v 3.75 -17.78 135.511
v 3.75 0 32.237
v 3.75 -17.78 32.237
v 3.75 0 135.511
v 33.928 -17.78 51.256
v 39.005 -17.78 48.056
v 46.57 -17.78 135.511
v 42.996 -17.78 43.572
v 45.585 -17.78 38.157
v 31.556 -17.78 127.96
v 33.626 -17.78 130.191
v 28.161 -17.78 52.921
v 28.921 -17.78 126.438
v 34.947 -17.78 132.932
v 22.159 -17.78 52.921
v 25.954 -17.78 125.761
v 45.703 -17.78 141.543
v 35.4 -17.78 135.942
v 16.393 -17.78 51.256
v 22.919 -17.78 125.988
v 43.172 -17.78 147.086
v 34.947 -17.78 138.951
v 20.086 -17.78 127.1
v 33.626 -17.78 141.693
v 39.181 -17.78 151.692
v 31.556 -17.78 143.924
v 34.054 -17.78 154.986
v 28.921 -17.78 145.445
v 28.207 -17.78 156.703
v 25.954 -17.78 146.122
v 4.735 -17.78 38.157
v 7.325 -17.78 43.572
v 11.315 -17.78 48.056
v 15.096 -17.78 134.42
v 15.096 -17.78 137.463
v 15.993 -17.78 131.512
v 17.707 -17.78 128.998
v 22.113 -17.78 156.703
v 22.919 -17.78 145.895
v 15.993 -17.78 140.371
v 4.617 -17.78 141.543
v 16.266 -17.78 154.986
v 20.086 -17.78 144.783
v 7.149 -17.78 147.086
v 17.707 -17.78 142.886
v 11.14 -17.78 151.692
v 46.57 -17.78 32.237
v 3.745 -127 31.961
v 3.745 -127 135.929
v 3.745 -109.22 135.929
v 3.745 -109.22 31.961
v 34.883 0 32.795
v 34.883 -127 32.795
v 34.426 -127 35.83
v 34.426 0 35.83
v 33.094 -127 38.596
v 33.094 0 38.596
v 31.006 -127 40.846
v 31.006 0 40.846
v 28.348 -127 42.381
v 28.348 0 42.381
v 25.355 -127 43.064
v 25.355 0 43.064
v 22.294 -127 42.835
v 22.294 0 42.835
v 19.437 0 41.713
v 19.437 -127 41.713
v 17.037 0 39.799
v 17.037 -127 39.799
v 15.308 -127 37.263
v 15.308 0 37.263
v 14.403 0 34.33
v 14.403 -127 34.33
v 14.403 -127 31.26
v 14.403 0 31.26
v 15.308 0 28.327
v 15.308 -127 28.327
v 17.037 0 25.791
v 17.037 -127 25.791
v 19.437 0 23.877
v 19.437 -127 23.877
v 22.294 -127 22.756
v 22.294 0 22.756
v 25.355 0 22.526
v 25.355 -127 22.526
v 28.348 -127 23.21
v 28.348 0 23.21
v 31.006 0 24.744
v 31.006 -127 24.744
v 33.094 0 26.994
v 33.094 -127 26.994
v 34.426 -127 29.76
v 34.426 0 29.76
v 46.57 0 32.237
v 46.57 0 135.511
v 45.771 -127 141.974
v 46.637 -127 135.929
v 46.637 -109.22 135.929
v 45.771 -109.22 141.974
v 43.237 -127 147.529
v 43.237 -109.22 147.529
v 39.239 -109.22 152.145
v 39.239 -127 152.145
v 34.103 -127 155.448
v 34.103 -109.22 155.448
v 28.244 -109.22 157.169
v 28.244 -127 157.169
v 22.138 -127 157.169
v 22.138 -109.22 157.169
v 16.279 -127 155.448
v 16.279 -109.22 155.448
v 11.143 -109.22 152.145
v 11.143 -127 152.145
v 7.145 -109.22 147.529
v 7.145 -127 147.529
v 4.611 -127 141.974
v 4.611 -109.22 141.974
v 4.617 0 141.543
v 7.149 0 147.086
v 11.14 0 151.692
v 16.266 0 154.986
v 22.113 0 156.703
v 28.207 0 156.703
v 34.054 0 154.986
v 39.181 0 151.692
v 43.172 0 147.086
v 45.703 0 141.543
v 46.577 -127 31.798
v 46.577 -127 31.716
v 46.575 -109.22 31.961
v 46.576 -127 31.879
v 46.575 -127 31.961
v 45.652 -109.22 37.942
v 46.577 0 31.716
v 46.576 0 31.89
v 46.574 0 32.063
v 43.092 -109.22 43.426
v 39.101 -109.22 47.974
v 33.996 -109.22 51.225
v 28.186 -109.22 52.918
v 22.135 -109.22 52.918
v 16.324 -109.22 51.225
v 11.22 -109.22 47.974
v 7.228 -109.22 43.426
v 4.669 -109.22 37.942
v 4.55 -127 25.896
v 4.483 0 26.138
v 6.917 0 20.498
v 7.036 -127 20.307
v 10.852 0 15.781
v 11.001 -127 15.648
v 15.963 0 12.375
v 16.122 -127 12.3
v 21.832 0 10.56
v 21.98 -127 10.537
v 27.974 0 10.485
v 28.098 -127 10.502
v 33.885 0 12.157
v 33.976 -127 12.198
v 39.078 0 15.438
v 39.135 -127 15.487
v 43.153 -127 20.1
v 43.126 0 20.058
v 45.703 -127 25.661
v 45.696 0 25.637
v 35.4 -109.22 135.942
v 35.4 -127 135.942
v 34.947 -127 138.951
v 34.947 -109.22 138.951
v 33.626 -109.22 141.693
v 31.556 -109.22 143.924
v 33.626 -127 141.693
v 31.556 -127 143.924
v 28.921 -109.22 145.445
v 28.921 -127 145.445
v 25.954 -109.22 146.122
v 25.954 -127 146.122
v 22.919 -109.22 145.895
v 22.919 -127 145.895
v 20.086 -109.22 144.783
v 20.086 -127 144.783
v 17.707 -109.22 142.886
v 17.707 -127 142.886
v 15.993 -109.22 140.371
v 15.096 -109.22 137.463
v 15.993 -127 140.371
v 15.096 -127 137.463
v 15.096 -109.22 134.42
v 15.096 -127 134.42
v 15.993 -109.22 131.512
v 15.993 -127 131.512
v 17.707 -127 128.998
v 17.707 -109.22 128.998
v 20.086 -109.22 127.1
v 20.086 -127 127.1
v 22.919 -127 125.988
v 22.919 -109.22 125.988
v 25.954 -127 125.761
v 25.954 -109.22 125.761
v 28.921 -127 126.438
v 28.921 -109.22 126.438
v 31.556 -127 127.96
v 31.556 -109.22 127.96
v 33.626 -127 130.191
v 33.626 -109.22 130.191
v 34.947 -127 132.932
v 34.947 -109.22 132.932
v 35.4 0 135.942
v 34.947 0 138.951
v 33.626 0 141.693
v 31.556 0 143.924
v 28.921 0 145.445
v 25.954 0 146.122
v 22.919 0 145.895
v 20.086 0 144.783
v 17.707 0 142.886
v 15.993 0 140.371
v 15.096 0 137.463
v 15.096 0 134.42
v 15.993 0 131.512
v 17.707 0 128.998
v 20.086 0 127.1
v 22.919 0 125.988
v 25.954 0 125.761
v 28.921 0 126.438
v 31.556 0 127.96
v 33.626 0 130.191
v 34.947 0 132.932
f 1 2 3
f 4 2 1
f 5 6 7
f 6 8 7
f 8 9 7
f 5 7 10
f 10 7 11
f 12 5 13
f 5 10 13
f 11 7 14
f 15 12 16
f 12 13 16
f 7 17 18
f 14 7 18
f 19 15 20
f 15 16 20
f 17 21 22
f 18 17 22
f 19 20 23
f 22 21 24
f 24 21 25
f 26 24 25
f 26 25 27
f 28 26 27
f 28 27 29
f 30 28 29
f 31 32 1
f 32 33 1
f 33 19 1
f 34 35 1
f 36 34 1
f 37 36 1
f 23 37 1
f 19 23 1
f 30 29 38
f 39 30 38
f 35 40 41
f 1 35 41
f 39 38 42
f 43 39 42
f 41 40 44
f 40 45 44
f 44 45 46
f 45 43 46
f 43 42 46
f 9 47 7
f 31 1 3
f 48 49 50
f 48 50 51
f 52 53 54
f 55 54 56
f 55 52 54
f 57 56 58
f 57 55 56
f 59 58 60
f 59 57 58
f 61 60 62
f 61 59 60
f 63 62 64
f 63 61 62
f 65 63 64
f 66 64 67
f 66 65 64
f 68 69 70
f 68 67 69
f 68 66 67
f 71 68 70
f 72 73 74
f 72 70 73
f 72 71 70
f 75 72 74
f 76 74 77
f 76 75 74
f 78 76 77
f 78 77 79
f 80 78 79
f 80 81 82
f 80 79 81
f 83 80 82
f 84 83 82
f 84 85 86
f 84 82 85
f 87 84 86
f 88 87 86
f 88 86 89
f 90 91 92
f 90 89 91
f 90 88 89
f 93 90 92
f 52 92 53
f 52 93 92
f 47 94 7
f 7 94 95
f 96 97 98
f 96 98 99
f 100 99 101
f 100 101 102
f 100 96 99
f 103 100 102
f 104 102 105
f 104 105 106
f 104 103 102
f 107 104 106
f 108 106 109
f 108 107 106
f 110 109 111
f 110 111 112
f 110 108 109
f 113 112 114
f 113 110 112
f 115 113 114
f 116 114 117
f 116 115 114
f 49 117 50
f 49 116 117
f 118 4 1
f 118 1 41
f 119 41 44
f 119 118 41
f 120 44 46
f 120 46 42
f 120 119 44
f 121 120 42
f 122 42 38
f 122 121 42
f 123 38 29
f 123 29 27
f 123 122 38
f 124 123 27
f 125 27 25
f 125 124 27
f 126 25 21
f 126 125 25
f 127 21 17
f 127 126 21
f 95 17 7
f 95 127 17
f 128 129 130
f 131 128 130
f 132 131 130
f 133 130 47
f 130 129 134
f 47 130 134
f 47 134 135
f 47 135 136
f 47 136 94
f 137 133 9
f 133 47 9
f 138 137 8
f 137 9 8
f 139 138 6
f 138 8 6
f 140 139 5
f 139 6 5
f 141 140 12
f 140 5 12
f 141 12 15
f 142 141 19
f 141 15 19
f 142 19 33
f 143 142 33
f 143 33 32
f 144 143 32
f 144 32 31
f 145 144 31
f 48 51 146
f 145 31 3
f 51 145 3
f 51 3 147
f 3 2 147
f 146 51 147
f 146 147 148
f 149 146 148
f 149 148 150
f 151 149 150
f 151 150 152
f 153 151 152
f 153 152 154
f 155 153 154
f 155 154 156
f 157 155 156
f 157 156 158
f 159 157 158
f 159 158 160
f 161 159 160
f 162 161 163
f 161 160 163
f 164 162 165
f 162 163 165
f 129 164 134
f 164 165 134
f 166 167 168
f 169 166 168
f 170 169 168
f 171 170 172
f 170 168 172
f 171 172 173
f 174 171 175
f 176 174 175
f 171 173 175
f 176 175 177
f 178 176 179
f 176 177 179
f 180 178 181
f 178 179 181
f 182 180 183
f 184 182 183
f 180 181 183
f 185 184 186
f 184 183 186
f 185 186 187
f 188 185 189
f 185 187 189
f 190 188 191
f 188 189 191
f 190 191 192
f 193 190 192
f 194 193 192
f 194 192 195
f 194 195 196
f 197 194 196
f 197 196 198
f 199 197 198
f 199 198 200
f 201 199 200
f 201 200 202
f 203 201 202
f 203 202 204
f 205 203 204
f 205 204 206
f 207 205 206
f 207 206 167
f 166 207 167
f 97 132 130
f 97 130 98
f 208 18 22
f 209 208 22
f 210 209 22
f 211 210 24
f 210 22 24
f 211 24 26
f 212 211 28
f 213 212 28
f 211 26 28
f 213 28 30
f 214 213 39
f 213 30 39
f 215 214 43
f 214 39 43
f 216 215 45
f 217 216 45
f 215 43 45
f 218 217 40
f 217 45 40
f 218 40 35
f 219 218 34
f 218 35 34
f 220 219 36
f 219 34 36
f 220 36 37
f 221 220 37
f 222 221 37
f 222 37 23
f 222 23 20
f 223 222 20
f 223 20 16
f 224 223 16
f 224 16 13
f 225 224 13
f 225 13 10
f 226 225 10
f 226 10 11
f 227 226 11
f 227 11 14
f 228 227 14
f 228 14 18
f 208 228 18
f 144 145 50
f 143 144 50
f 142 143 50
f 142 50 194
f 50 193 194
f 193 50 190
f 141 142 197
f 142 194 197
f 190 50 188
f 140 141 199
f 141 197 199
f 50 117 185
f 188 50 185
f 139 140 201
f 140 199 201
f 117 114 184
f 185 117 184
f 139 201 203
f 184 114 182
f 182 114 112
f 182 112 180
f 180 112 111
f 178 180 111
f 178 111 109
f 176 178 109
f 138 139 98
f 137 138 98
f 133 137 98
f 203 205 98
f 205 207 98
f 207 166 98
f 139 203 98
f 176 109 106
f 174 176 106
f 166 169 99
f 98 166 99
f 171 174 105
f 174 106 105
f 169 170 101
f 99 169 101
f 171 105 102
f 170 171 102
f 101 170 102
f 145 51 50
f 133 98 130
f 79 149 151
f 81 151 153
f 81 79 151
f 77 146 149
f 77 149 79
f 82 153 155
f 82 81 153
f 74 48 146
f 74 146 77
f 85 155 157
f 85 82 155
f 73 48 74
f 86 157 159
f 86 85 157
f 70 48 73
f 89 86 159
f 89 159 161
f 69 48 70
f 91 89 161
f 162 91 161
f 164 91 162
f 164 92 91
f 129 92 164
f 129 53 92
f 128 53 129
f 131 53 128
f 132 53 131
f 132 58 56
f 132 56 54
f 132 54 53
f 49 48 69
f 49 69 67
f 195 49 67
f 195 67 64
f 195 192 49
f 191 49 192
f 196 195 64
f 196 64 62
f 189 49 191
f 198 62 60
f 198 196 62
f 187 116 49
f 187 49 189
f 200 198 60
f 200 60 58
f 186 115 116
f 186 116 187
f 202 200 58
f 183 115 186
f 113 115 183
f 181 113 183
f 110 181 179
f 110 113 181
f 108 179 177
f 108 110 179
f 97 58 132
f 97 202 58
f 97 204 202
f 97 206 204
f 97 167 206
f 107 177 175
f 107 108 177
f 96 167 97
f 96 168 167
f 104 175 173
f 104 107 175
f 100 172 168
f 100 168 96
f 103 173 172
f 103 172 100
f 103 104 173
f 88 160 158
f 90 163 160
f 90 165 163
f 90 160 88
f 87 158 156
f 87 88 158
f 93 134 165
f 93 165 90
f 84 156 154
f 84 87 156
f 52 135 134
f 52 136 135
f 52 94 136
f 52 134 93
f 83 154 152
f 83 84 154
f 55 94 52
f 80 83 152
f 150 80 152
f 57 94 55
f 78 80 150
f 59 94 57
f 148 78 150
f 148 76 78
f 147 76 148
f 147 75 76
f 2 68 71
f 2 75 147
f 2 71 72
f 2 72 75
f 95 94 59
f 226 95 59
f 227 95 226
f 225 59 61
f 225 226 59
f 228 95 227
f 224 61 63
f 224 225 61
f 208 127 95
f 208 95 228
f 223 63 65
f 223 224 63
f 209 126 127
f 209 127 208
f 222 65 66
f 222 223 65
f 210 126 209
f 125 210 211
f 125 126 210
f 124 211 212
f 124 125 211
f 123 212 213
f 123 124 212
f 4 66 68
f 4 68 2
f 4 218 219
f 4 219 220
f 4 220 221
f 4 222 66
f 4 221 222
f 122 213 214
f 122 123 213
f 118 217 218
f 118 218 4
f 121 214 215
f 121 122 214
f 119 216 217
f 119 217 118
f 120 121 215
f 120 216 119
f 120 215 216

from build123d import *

# Parameters (mm, degrees)
F0_R      = 21.4164389033
F1_DEPTH  = 127
F2_W      = 42.8202235004
F2_H      = 103.2743248374
F3_DEPTH  = 17.78
F5_DEPTH  = 17.78
F6_R      = 7.3683109371
F7_DEPTH  = 273
F8_R      = 10.2975296605
F9_DEPTH  = 127.001
F11_DEPTH = 17.78
F13_DEPTH = 17.78
F14_R     = 10.2092328794
F15_DEPTH = 127.001


# Not quite as in the source:
# - an extrude ends at something that could not be found from the text; its depth is read off the source's solid


with BuildPart() as f1:
    # F0 (on Front) → F1 (new body)
    with BuildSketch(Plane.XZ):
        with Locations((25.1603480428, 31.716234982)):
            Circle(F0_R)
    extrude(amount=F1_DEPTH)

    # F2 (on face) → F3 (join)
    with BuildSketch(Plane(origin=(0, 0, 0), x_dir=(-1, 0, 0), z_dir=(0, 1, 0))):
        with Locations((-25.1603480428, 83.8739453241)):
            Rectangle(F2_W, F2_H)
    extrude(amount=-F3_DEPTH)

    # F4 (on face) → F5 (join)
    with BuildSketch(Plane.XZ.offset(127)):
        Polygon((3.7453082572, 31.961033423), (46.5753878285, 31.961033423), (46.636801213, 135.9289437532), (3.7453082572, 135.9289437532), align=None)
    extrude(amount=-F5_DEPTH)

    # F6 (on Front) → F7 (cut, through all)
    with BuildSketch(Plane.XZ):
        with Locations((25.2368301153, 31.4926542342)):
            Circle(F6_R)
    extrude(amount=-F7_DEPTH, mode=Mode.SUBTRACT)

    # F8 (on Front) → F9 (cut, through all)
    with BuildSketch(Plane.XZ):
        with Locations((24.5855599642, 32.795201987)):
            Circle(F8_R)
    extrude(amount=F9_DEPTH, mode=Mode.SUBTRACT)

    # F10 (on face) → F11 (join)
    with BuildSketch(Plane.XZ.offset(127)):
        with BuildLine():
            Line((3.7453082572, 135.9289437532), (46.636801213, 135.9289437532))
            ThreePointArc((46.636801213, 135.9289437532), (25.1910547351, 157.3873618801), (3.7453082572, 135.9289437532))
        make_face()
    extrude(amount=-F11_DEPTH)

    # F12 (on face) → F13 (join)
    with BuildSketch(Plane(origin=(0, 0, 0), x_dir=(-1, 0, 0), z_dir=(0, 1, 0))):
        with BuildLine():
            Line((-46.5704597931, 135.5111077428), (-3.7502362926, 135.5111077428))
            ThreePointArc((-3.7502362926, 135.5111077428), (-25.1603480428, 156.921219493), (-46.5704597931, 135.5111077428))
        make_face()
    extrude(amount=-F13_DEPTH)

    # F14 (on face) → F15 (cut, through all)
    with BuildSketch(Plane.XZ.offset(127)):
        with Locations((25.1910547351, 135.9416116608)):
            Circle(F14_R)
    extrude(amount=-F15_DEPTH, mode=Mode.SUBTRACT)


solid = f1.part
